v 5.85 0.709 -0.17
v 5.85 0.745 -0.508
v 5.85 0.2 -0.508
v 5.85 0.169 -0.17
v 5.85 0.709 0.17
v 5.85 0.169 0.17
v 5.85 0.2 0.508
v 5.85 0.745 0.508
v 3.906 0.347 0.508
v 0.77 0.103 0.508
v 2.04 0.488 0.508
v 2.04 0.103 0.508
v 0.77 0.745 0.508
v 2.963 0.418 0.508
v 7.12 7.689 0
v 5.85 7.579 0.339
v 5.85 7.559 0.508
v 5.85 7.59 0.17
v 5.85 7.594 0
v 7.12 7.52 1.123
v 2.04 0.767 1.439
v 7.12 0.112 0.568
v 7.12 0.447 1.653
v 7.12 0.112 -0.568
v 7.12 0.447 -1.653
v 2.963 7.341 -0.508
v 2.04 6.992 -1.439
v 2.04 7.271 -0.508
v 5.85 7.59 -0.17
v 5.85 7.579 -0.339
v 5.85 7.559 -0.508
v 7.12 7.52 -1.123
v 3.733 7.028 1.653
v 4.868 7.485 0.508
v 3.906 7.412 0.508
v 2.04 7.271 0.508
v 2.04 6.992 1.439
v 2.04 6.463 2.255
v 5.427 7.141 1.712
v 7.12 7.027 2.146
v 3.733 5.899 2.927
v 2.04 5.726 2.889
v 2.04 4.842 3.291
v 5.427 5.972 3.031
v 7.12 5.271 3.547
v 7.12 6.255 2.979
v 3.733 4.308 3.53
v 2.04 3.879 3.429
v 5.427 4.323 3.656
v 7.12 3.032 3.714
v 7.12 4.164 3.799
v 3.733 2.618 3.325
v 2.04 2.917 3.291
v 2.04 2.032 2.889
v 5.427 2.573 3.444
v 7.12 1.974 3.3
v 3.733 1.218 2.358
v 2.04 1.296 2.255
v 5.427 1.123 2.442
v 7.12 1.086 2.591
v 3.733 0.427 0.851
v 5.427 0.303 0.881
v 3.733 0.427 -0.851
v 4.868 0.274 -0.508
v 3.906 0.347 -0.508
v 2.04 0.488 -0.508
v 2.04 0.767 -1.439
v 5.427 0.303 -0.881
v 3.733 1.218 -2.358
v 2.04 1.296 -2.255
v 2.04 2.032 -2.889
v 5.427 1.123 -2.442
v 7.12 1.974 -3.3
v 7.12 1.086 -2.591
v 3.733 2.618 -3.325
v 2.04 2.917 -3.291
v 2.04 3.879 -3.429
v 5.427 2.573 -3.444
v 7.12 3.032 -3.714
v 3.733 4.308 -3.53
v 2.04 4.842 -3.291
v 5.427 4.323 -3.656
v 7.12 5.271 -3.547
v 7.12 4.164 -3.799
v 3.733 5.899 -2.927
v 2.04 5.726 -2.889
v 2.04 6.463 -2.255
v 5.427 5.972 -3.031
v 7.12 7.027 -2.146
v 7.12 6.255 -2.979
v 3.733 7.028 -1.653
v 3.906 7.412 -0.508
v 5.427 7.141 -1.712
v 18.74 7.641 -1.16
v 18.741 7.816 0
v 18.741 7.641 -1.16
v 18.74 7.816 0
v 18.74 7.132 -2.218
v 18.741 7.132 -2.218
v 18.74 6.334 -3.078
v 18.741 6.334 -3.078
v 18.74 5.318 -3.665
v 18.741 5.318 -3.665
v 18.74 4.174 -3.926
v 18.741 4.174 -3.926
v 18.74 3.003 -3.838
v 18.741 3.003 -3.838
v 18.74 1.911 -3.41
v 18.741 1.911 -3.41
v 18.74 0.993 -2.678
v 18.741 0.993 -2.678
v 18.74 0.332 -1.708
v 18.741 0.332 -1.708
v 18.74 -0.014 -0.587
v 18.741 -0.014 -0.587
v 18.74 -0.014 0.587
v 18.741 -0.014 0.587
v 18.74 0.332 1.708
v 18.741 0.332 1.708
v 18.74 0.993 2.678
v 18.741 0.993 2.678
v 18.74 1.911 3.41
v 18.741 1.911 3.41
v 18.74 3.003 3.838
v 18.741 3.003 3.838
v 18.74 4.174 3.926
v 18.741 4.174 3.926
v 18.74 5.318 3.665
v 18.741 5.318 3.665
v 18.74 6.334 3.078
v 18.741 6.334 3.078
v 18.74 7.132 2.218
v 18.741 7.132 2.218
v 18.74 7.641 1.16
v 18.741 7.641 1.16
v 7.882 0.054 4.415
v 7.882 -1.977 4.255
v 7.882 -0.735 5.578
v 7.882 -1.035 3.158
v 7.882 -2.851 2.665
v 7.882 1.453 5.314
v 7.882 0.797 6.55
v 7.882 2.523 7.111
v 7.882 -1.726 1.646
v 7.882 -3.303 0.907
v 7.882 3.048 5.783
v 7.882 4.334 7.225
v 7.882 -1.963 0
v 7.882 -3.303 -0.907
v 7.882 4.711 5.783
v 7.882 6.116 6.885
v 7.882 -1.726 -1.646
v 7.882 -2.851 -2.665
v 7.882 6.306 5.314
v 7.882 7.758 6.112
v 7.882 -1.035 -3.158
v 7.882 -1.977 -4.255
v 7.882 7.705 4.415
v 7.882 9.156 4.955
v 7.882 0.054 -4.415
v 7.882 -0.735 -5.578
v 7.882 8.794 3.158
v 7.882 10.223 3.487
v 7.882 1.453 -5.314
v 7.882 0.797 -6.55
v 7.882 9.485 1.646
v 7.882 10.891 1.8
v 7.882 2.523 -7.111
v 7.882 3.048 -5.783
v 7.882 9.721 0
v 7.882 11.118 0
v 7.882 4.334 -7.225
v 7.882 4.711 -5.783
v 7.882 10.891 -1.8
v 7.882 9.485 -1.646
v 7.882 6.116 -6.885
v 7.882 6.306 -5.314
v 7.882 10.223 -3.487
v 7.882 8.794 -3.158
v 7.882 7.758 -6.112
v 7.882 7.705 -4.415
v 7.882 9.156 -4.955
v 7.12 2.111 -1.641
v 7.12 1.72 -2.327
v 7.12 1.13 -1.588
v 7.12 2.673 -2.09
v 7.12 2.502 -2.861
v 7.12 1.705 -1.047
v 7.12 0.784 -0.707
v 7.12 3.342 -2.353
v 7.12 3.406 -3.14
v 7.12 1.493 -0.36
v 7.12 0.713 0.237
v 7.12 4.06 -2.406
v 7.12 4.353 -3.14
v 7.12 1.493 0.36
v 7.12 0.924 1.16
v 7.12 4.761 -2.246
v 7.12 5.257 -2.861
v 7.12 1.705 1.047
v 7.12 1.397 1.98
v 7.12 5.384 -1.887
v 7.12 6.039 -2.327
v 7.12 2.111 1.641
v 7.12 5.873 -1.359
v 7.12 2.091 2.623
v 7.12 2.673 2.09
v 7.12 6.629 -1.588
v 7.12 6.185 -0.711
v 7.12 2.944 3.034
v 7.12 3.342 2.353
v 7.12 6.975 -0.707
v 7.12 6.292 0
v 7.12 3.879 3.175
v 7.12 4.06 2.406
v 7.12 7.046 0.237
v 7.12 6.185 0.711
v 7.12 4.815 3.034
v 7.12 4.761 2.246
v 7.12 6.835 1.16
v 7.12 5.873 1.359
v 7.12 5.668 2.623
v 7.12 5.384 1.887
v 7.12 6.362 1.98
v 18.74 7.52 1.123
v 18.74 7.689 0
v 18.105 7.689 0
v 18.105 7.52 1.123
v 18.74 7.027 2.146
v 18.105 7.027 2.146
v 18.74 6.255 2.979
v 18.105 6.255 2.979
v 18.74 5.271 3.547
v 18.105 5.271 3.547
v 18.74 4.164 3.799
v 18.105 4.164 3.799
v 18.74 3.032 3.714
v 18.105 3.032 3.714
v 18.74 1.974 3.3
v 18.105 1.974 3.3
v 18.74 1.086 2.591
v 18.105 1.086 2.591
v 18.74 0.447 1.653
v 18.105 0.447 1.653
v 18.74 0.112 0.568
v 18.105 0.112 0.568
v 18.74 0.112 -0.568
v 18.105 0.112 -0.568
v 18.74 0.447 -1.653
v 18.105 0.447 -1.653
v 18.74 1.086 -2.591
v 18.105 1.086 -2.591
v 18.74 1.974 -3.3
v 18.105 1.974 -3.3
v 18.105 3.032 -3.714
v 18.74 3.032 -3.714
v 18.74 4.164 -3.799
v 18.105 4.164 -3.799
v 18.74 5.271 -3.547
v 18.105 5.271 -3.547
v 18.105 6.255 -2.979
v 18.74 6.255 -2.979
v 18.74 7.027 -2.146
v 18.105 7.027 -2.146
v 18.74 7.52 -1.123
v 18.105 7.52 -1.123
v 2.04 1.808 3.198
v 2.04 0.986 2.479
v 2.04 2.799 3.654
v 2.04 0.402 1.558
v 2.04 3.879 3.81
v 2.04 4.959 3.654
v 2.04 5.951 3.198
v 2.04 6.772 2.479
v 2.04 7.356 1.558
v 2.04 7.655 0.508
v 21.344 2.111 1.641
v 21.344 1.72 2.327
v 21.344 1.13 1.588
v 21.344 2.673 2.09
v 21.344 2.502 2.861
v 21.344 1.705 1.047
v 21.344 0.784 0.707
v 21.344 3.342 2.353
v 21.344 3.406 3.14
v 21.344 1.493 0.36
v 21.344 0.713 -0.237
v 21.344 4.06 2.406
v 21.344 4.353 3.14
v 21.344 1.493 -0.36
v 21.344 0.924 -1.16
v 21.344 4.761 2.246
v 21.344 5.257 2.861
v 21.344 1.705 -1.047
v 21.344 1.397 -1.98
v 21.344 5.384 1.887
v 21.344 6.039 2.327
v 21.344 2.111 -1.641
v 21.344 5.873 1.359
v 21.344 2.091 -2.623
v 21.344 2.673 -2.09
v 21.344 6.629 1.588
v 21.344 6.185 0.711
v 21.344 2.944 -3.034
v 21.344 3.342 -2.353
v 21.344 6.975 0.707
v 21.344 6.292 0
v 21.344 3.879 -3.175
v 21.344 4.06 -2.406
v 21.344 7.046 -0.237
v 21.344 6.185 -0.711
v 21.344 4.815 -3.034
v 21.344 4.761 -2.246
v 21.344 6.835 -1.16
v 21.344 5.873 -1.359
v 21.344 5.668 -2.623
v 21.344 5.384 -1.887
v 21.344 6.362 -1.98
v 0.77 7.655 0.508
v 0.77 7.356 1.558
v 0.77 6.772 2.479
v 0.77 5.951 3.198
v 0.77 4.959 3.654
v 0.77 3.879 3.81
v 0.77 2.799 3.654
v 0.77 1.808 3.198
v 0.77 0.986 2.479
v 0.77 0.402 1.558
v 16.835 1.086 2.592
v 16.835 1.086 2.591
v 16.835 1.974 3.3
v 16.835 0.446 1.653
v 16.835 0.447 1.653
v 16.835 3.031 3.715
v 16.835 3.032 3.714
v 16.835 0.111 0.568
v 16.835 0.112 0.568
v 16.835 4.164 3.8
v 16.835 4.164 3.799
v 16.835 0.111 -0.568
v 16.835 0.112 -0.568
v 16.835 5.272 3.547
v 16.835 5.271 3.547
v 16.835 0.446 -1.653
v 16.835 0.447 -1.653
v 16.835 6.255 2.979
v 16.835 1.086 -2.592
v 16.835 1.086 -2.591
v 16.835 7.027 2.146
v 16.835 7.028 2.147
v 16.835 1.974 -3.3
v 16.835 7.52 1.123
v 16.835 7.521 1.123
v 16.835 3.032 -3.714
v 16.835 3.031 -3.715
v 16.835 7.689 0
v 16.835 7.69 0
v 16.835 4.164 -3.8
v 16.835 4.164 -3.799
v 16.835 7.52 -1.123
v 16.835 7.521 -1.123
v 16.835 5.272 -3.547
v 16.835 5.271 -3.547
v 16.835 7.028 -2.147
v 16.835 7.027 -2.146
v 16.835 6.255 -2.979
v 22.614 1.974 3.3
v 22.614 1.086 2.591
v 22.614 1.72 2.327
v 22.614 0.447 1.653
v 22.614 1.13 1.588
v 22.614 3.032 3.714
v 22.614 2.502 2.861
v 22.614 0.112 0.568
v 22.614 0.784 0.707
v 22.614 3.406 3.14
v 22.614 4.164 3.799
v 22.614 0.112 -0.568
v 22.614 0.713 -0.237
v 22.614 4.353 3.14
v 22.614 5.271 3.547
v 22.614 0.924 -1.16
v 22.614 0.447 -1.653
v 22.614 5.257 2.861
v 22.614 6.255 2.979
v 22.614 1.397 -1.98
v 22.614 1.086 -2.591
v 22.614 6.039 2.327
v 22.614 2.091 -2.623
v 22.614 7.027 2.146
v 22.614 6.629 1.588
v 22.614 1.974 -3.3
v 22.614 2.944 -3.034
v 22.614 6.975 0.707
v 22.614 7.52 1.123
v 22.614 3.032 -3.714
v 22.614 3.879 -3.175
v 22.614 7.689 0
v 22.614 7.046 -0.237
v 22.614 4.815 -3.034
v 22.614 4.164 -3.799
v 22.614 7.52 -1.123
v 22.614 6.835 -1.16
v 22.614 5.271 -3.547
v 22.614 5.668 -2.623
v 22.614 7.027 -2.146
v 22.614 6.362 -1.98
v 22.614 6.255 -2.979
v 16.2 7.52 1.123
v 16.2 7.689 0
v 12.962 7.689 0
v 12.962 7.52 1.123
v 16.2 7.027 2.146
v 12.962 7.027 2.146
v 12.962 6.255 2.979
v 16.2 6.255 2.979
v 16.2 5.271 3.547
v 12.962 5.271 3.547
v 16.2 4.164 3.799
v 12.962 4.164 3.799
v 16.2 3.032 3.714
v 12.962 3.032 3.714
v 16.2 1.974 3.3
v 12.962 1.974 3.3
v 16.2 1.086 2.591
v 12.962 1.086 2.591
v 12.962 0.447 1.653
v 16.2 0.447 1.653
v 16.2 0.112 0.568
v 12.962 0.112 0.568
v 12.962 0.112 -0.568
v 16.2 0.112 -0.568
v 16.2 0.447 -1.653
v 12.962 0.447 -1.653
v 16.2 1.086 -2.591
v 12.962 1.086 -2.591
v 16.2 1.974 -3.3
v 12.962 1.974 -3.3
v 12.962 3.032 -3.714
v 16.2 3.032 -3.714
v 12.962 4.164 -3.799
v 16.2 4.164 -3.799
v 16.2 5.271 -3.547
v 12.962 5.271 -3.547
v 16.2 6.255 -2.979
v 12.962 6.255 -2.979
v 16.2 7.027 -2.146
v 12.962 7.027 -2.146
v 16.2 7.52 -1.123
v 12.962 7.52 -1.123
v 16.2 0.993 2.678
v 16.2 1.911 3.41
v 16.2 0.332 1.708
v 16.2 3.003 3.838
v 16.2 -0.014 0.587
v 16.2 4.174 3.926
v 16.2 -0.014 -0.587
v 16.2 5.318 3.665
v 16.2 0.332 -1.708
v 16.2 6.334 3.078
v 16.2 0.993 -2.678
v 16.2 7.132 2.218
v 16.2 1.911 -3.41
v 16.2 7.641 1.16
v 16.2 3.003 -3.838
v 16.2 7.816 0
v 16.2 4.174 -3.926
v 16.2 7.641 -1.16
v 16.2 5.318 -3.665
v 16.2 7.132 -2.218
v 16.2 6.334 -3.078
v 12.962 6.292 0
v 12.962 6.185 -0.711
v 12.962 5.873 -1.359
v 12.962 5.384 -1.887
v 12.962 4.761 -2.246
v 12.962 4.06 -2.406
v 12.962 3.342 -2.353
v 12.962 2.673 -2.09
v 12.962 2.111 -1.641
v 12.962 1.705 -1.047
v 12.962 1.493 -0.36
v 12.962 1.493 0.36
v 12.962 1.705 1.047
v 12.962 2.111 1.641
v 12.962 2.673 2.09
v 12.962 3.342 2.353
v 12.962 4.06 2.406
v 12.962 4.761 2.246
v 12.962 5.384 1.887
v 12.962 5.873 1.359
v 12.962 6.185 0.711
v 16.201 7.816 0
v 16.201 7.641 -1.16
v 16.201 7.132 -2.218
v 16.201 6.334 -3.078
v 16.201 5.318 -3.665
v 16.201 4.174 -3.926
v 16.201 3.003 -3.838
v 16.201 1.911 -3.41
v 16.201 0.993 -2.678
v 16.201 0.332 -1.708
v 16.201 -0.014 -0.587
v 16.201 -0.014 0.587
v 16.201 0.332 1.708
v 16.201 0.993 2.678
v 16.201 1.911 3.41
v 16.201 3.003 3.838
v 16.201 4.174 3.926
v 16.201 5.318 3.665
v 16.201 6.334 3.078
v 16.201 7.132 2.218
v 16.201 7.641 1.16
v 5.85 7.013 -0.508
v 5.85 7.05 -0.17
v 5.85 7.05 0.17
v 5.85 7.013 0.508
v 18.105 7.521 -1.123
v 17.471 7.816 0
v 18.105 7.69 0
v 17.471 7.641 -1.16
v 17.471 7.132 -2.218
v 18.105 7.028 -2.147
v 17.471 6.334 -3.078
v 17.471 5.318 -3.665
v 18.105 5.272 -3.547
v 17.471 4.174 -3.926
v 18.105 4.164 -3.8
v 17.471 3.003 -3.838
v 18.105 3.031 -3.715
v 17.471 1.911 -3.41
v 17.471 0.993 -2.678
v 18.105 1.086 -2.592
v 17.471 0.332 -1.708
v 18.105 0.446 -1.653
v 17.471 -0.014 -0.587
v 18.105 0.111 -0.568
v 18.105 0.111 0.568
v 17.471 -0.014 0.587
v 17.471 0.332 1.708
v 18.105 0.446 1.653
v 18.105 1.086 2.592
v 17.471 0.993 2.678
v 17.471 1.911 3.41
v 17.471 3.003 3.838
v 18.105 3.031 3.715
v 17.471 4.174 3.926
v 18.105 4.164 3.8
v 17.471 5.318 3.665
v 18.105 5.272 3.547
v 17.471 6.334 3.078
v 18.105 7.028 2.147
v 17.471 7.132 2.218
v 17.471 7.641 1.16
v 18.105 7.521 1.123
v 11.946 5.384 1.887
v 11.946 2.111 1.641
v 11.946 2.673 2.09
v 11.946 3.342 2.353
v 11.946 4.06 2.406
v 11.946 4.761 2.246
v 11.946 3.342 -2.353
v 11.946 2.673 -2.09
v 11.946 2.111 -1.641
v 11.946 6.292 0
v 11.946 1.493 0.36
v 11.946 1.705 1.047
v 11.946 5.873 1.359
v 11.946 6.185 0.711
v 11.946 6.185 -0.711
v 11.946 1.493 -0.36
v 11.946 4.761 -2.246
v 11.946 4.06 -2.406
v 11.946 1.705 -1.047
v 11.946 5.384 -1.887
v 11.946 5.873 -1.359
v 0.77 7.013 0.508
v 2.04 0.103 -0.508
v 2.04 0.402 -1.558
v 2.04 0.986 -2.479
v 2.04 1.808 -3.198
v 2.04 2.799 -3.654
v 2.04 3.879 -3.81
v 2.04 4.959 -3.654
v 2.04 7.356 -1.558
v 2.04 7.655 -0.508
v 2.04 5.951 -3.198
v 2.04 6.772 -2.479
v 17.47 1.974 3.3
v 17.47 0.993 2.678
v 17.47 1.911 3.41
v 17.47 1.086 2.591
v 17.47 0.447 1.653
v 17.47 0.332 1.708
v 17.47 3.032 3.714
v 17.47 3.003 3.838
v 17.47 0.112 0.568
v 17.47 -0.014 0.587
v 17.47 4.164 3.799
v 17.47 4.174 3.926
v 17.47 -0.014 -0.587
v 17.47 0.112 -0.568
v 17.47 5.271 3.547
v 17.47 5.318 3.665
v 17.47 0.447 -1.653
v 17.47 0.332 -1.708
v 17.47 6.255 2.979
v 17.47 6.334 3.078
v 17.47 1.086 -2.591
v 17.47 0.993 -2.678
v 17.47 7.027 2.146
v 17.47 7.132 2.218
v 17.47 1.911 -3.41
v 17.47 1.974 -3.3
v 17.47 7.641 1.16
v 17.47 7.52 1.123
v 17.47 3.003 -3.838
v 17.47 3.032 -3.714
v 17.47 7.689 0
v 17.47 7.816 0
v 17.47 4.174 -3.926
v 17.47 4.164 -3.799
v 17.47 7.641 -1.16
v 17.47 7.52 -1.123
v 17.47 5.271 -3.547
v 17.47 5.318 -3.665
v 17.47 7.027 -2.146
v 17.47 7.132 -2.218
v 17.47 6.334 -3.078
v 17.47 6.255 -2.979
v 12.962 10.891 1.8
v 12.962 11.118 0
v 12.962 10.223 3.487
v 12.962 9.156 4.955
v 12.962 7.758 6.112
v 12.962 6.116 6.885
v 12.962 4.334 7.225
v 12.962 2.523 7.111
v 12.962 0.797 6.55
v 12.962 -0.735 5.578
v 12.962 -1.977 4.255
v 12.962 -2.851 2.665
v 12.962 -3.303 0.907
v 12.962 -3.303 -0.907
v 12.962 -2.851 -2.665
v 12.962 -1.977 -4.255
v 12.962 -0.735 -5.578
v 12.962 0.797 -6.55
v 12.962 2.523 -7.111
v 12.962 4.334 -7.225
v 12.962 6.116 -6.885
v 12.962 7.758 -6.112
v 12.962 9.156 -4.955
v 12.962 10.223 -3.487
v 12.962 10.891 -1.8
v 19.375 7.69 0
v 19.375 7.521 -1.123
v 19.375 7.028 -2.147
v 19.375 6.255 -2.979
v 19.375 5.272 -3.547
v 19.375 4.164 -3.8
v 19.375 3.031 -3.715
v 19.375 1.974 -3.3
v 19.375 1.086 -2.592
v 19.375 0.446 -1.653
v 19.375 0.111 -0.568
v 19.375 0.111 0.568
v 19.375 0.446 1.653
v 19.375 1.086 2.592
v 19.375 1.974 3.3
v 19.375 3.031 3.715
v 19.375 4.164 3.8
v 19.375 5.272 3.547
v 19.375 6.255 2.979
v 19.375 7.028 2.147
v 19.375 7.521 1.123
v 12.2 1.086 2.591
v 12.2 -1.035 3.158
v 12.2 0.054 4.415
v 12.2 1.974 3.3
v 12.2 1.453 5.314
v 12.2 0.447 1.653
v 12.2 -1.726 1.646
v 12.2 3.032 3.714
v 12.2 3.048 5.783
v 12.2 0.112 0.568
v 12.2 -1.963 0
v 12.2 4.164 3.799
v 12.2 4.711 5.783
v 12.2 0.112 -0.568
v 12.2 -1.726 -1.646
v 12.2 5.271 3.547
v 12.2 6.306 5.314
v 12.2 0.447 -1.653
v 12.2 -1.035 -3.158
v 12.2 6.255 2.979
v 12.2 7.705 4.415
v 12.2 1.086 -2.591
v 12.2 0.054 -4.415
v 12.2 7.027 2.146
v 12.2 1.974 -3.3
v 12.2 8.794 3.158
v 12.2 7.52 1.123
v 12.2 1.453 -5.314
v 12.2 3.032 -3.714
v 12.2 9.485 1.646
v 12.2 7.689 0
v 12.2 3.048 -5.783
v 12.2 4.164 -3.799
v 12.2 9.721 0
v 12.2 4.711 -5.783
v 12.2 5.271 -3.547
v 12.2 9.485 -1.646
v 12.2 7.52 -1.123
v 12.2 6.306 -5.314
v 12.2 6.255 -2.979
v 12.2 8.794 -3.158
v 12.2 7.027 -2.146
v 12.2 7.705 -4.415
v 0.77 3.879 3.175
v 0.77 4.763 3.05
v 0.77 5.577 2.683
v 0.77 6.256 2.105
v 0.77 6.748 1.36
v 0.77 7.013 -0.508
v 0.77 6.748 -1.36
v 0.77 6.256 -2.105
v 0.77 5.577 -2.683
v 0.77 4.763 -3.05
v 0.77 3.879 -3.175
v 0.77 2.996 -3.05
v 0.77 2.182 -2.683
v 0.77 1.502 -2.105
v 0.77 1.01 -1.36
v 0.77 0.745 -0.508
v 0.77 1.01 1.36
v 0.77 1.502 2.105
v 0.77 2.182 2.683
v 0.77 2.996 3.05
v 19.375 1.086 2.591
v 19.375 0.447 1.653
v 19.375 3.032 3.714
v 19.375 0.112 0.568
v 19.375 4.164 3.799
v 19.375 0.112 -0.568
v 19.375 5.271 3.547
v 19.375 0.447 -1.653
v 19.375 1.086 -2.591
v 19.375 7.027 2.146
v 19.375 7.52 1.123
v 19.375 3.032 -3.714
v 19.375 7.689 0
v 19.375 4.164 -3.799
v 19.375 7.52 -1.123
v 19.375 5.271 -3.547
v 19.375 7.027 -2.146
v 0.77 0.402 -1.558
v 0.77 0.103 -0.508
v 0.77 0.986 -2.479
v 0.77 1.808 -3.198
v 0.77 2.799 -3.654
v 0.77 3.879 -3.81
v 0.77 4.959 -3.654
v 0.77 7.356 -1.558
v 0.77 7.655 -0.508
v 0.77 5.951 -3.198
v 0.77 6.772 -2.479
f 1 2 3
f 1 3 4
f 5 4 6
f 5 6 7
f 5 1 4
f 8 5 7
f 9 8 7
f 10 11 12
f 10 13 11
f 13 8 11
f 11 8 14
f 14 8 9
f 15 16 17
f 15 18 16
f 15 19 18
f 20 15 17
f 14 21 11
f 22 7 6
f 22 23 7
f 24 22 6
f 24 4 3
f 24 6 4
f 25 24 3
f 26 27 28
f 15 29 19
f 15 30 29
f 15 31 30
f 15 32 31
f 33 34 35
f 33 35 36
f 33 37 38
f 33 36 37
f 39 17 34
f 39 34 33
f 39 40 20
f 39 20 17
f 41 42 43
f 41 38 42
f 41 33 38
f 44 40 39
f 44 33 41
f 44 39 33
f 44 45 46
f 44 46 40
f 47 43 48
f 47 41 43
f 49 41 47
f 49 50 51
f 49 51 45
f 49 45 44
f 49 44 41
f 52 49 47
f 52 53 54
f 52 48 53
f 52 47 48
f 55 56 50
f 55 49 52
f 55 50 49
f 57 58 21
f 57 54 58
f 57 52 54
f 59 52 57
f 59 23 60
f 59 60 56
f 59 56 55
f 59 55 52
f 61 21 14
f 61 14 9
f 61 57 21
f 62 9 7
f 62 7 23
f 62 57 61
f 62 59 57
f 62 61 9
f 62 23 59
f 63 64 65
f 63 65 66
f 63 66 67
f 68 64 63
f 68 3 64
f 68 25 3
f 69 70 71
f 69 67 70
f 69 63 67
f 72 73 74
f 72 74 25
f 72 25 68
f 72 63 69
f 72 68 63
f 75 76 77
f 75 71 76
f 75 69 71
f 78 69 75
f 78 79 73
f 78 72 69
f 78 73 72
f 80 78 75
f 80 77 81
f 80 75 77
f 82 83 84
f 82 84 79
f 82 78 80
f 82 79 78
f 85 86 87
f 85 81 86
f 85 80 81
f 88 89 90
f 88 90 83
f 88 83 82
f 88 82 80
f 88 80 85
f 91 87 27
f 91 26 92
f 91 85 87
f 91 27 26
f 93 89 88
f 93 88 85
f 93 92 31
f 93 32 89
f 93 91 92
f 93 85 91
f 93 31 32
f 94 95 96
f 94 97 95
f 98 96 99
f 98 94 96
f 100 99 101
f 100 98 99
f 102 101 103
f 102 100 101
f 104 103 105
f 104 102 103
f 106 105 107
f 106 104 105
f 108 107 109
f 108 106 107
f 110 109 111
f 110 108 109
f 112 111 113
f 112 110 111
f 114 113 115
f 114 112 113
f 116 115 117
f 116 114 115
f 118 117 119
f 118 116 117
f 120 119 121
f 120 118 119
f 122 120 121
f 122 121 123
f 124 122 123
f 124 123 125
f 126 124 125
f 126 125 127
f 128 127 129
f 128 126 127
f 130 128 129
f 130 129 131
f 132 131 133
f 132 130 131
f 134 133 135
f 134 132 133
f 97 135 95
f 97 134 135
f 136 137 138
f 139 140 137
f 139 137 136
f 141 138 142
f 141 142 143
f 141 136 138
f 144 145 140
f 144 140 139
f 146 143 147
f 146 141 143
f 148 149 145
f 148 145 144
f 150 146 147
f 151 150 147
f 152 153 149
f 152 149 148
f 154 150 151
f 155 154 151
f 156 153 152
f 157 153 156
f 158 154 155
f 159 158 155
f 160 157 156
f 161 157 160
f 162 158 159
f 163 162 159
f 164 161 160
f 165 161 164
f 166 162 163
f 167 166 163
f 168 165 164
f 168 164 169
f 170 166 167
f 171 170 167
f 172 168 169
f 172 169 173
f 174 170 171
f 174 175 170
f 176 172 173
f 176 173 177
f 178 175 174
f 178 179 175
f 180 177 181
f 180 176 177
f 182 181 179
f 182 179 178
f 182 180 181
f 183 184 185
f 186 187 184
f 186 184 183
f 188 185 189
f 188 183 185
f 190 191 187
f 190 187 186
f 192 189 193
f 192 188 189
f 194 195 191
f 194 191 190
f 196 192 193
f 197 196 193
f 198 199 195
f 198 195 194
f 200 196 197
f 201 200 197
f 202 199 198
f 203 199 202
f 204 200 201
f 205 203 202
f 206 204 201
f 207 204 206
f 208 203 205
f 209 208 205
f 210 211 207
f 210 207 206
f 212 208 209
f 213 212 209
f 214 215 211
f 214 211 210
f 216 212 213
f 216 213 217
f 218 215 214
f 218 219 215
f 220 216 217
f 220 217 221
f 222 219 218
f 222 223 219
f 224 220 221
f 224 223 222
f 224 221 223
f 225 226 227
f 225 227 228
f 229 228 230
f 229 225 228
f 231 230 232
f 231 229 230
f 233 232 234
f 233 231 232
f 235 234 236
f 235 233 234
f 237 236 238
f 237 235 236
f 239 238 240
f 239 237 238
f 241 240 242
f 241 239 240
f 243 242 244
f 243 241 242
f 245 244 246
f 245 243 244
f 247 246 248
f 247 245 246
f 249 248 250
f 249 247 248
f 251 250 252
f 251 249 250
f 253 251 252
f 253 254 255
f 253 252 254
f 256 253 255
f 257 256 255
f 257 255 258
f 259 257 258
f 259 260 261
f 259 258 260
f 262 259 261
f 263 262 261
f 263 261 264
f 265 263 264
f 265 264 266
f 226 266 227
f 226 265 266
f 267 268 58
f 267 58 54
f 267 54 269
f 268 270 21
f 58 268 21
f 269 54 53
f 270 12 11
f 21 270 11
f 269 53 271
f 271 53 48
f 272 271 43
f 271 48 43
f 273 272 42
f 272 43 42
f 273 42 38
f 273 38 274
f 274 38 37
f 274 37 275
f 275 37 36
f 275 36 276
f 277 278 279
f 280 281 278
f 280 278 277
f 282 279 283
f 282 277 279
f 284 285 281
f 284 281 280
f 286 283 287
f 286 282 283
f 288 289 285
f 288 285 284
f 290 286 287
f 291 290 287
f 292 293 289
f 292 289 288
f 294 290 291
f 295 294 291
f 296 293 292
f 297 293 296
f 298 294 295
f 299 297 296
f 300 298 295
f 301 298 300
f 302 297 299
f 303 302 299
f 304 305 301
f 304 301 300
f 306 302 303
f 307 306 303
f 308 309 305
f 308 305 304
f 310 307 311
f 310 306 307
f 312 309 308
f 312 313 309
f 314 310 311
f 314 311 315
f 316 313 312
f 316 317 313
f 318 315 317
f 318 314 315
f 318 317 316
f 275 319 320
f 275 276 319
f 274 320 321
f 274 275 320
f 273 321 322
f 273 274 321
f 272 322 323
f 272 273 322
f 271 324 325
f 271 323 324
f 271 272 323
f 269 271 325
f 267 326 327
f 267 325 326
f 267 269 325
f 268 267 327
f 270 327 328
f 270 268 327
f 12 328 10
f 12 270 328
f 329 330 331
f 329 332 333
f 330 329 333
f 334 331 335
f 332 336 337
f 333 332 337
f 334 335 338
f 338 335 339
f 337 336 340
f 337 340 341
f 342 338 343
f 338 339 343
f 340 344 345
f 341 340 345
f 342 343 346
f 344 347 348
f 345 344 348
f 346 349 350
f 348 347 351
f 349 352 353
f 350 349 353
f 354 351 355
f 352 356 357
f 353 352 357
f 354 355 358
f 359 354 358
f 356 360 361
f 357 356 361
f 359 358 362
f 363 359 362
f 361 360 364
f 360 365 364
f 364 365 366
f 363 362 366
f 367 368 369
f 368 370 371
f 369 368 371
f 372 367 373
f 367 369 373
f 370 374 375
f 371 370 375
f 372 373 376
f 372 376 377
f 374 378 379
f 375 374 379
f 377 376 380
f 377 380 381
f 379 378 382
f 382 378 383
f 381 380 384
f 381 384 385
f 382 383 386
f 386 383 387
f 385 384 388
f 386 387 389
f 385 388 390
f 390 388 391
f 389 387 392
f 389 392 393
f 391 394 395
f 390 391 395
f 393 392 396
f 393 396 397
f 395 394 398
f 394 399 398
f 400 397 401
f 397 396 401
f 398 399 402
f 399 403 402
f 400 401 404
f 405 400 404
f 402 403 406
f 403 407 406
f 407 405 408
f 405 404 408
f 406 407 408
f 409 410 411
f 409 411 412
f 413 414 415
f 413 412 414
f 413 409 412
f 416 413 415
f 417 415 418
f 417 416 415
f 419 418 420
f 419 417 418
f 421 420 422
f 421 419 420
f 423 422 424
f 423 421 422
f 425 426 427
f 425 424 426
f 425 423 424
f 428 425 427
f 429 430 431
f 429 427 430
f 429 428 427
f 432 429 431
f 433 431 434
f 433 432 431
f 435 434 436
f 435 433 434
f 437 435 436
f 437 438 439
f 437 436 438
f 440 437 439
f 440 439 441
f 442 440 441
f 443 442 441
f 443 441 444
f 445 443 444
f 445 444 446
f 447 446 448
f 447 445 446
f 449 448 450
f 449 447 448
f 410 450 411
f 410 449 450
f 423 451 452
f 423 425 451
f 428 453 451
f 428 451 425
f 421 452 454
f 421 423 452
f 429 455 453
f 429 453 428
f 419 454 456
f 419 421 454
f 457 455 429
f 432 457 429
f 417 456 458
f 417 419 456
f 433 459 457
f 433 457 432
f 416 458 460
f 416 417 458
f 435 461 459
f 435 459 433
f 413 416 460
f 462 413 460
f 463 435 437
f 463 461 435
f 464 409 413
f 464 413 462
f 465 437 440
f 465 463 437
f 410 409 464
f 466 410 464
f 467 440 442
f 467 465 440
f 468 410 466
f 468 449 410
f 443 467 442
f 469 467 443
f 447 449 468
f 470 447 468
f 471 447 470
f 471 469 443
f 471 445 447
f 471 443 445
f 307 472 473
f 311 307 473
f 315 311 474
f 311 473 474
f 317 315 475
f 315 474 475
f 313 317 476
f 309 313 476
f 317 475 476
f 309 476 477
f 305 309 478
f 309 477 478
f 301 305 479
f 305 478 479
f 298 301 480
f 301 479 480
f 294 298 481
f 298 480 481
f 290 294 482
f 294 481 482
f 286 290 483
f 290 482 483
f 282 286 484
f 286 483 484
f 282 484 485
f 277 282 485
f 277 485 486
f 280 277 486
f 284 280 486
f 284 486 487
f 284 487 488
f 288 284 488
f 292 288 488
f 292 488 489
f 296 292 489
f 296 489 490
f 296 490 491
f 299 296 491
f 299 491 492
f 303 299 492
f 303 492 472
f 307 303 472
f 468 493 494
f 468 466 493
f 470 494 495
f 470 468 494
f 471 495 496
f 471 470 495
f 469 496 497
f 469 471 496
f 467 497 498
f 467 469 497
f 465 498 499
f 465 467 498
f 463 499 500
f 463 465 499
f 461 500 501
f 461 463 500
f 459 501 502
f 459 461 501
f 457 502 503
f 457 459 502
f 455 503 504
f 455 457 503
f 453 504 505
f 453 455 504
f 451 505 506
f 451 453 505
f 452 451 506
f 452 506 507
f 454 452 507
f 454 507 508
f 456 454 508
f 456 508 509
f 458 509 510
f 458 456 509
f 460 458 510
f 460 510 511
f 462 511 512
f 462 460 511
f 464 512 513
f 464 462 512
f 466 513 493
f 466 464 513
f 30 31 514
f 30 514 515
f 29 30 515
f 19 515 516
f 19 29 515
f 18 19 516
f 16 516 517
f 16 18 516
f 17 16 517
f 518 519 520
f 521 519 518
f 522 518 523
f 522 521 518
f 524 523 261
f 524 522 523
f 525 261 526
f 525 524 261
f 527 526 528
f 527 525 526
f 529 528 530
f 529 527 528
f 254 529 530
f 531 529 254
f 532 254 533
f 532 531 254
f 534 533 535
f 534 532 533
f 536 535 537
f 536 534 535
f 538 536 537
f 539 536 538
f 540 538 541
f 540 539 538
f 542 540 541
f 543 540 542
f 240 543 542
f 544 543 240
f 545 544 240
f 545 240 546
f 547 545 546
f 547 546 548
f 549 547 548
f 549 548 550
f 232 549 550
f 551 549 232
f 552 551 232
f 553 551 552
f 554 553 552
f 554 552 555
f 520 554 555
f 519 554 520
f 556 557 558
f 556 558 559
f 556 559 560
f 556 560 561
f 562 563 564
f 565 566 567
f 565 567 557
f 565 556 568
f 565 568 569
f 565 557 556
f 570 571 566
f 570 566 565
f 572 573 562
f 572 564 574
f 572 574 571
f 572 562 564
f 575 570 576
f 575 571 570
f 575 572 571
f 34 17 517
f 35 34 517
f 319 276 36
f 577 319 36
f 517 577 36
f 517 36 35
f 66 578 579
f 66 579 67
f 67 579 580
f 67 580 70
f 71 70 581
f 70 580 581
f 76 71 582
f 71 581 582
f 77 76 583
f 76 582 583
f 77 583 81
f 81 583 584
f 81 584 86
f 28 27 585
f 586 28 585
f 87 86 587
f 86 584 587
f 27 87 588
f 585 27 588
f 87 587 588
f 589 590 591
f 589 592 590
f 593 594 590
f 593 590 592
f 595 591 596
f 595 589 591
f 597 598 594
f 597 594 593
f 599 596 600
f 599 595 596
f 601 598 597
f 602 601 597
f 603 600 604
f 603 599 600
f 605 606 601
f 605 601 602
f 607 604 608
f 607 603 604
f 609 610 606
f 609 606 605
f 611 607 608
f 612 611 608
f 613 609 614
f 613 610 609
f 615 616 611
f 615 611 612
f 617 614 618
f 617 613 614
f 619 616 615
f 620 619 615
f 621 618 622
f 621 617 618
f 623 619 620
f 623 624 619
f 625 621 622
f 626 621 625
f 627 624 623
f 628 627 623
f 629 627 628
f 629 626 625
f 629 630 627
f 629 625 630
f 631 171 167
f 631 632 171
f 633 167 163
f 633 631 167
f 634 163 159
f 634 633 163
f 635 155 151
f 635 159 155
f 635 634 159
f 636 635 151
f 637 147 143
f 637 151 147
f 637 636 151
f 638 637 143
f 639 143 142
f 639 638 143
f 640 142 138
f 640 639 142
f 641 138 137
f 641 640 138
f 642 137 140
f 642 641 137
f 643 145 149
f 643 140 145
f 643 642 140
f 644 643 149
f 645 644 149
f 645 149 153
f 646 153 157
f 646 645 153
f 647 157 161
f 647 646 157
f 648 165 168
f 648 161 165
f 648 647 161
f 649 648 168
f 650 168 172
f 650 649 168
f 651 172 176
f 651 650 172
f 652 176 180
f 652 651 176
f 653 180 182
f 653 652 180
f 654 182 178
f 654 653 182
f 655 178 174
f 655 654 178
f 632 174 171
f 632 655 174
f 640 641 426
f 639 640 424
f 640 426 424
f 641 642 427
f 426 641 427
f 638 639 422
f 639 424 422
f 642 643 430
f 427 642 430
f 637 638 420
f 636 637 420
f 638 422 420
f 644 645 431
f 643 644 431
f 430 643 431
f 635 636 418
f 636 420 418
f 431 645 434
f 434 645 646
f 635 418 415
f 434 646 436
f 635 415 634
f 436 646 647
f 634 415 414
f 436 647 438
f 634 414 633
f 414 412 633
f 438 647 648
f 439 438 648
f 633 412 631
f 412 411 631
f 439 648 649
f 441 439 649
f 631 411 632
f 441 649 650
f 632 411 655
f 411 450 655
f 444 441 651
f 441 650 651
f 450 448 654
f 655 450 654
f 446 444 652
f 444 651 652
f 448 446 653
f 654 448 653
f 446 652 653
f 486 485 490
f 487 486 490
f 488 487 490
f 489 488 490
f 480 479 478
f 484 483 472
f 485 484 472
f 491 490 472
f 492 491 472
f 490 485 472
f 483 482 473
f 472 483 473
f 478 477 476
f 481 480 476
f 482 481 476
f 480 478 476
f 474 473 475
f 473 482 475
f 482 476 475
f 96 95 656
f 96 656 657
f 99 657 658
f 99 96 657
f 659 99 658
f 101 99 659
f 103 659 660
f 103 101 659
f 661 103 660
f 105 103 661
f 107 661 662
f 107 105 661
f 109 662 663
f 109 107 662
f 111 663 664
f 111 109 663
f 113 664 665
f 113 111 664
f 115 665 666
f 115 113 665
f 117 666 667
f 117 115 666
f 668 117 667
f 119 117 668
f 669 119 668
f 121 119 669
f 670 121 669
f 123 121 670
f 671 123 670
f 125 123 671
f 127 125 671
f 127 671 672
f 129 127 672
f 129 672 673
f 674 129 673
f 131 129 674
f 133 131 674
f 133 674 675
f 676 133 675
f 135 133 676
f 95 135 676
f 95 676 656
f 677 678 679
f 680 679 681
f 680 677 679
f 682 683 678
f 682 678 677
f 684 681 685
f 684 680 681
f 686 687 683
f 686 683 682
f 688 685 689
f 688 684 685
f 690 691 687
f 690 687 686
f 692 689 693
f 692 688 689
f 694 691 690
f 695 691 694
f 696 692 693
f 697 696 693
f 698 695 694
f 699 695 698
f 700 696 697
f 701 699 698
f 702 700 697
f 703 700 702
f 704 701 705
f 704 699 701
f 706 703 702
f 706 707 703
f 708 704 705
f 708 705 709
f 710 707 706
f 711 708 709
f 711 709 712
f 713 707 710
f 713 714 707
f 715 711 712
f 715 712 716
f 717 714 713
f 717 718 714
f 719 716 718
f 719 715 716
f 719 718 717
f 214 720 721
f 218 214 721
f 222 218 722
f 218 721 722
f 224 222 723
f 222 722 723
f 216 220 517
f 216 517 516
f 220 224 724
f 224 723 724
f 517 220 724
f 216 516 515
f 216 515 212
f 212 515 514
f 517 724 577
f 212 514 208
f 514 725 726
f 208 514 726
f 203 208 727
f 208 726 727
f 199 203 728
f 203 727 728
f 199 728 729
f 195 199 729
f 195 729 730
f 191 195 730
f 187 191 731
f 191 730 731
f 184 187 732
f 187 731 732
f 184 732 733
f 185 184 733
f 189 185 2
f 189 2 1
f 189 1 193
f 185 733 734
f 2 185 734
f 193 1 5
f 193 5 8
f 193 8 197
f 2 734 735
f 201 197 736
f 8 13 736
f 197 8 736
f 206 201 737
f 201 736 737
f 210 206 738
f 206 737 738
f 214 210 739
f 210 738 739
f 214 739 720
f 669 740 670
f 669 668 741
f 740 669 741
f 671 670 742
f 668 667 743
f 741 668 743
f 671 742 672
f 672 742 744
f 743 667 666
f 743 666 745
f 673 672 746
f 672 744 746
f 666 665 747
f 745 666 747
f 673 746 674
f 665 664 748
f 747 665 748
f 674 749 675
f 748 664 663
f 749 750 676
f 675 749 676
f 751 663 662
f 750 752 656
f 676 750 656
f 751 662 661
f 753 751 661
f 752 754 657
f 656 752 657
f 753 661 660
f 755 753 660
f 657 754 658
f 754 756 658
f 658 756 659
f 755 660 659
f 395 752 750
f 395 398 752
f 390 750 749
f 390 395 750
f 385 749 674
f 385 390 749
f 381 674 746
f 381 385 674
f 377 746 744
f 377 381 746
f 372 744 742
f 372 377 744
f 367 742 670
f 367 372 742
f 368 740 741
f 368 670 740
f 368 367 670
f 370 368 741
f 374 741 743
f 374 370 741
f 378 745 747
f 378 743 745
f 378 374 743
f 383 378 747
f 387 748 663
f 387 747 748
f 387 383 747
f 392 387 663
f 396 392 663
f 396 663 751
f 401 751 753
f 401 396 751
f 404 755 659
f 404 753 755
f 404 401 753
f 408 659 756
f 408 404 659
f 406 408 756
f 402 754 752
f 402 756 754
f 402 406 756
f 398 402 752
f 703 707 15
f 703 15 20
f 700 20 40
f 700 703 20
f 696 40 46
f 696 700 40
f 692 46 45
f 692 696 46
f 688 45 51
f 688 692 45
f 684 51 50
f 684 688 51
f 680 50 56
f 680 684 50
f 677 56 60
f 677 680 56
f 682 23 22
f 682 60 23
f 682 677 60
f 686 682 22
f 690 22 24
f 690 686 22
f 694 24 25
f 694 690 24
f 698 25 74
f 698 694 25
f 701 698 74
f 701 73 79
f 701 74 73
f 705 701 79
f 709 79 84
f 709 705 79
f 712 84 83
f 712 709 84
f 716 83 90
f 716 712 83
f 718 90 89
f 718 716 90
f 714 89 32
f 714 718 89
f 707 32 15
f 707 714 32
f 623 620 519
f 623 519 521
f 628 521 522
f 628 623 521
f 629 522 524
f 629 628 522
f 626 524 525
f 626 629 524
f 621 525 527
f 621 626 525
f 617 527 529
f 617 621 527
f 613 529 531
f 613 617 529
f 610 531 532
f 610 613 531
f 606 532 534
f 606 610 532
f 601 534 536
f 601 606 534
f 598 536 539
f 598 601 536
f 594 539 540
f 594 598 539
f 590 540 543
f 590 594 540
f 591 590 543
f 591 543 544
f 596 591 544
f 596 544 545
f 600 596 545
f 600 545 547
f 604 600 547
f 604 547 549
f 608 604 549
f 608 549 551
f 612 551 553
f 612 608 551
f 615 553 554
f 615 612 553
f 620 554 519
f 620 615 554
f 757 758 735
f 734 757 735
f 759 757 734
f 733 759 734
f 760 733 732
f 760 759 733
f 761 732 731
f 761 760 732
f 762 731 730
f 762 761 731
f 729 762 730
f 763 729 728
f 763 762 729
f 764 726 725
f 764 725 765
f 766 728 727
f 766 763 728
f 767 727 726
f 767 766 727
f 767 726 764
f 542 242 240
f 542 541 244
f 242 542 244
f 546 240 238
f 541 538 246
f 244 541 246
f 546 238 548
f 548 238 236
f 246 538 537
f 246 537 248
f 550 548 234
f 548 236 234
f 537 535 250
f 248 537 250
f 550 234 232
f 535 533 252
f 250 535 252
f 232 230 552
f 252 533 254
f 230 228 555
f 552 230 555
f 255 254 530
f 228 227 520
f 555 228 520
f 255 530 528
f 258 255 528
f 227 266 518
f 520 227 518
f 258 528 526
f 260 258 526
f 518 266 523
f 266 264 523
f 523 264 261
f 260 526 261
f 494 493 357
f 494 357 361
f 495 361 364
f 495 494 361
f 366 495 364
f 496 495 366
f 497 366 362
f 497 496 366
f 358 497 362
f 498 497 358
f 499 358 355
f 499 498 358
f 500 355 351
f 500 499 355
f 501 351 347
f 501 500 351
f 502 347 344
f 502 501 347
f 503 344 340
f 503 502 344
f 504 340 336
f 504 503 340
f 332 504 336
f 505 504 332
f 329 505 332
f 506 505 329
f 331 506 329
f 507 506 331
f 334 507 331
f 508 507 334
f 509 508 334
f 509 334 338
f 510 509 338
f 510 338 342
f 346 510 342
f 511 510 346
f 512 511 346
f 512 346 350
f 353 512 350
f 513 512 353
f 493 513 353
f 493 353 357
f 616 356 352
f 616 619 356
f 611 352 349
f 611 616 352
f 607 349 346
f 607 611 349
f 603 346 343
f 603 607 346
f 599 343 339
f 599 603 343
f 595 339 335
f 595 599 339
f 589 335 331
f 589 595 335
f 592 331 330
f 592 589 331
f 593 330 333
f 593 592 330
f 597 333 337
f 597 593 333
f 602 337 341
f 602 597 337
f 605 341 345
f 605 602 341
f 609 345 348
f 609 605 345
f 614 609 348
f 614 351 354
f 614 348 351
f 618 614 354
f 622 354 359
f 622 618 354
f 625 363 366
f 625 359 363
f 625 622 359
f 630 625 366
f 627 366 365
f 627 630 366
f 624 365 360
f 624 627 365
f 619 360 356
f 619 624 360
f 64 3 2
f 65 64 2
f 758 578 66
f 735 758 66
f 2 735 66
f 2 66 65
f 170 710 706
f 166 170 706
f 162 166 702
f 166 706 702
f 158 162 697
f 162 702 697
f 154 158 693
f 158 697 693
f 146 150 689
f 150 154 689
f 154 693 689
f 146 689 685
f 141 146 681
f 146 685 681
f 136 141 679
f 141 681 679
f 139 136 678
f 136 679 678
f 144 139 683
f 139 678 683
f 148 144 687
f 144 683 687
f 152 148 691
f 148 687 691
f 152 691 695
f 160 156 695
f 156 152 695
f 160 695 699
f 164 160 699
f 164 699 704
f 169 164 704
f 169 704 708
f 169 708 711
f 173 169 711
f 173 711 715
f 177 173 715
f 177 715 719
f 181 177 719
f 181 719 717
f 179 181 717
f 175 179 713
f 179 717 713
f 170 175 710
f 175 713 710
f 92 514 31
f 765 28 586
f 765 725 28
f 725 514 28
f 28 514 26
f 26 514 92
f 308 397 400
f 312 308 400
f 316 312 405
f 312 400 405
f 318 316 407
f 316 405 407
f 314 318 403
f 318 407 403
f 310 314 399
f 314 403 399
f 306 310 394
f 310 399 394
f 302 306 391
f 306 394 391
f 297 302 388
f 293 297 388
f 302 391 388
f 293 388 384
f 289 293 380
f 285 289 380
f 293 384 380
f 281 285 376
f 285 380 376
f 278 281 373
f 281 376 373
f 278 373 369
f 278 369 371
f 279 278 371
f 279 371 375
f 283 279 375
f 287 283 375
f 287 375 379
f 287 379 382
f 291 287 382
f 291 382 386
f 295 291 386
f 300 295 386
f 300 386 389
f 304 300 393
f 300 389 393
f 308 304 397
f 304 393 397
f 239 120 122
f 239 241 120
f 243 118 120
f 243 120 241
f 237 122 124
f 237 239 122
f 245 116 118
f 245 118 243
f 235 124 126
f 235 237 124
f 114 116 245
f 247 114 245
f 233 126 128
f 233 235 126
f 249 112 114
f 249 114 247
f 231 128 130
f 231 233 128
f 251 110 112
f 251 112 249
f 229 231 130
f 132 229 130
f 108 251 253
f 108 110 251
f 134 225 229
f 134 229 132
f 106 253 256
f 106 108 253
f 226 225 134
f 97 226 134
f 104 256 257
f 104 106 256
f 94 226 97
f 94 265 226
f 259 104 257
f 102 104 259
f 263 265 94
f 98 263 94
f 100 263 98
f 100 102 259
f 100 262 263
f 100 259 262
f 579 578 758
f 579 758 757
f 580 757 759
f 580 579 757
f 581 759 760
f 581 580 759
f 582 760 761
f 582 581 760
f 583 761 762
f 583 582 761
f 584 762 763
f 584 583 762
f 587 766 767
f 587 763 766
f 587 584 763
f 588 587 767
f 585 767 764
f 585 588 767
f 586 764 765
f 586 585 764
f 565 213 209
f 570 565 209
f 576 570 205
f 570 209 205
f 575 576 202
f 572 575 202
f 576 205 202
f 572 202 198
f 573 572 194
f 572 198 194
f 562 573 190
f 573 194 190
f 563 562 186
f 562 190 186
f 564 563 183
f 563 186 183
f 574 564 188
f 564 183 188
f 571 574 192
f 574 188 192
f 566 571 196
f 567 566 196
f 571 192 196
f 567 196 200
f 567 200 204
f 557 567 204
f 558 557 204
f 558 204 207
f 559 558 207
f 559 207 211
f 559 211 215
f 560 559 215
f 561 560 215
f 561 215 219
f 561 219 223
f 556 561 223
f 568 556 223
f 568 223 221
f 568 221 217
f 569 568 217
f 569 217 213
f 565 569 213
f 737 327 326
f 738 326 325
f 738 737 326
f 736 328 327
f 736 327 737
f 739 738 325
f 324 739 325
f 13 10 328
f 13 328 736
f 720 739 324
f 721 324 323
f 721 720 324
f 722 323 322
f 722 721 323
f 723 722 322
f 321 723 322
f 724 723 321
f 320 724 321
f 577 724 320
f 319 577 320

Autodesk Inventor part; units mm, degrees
ref_plane "YZ Plane" through (0, 0, 0) normal (1, 0, 0) x (0, 1, 0)
ref_plane "XZ Plane" through (0, 0, 0) normal (0, 1, 0) x (-1, 0, 0)
ref_plane "XY Plane" through (0, 0, 0) normal (0, 0, 1) x (1, 0, 0)
sketch "Sketch1" plane through (0, 0, 0) normal (0, 0, 1) x (1, 0, 0)
  line L0 (22.6139, 7.6894) -> (22.6139, 6.2924)
  line L1 (0.7699, 6.2924) -> (0.7699, 7.6894)
  line L2 (11.9459, 3.8794) -> (12.9619, 3.8794)
  line L3 (12.9619, 3.8794) -> (12.9619, 6.2924)
  line L4 (11.9459, 6.2924) -> (11.9459, 3.8794)
  line L5 (11.9459, 6.2924) -> (0.7699, 6.2924)
  line L6 (12.1999, 7.6894) -> (12.1999, 9.7214)
  line L7 (12.1999, 11.1184) -> (12.9619, 11.1184)
  line L8 (12.9619, 11.1184) -> (12.9619, 7.6894)
  line L9 (12.9619, 11.1184) -> (7.8819, 11.1184)
  line L10 (7.8819, 11.1184) -> (7.8819, 9.7214)
  line L11 (7.8819, 9.7214) -> (12.1999, 9.7214)
  line L12 (12.9619, 9.7214) -> (12.9619, 11.1184)
  line L13 (11.9459, 3.8794) -> (0.9057, 3.8794)
  line L14 (0.7699, 7.6894) -> (2.0399, 7.6894)
  line L15 (2.0399, 7.6894) -> (2.0399, 7.3084)
  line L16 (0.7699, 7.6894) -> (2.0399, 7.6894)
  line L17 (7.1199, 7.6894) -> (2.0399, 7.3084)
  line L18 (0.7699, 7.6894) -> (2.0399, 7.6894)
  line L19 (7.1199, 7.6894) -> (12.1999, 7.6894)
  line L20 (18.1054, 7.8164) -> (17.4704, 7.8164)
  line L21 (17.4704, 6.1654) -> (18.1054, 7.8164) construction
  line L22 (18.1054, 6.1654) -> (17.4704, 7.8164) construction
  line L23 (16.8354, 7.8164) -> (16.2004, 7.8164)
  line L24 (16.2004, 6.1654) -> (16.8354, 7.8164) construction
  line L25 (16.8354, 6.1654) -> (16.2004, 7.8164) construction
  line L26 (19.3754, 7.8164) -> (18.7404, 7.8164)
  line L27 (18.7404, 6.1654) -> (19.3754, 7.8164) construction
  line L28 (19.3754, 6.1654) -> (18.7404, 7.8164) construction
  line L29 (16.2004, 7.8164) -> (16.2004, 7.6894)
  line L30 (16.8354, 7.6894) -> (16.8354, 7.8164)
  line L31 (17.4704, 7.8164) -> (17.4704, 7.6894)
  line L32 (18.1054, 7.6894) -> (18.1054, 7.8164)
  line L33 (18.7404, 7.8164) -> (18.7404, 7.6894)
  line L34 (19.3754, 7.6894) -> (19.3754, 7.8164)
  line L35 (19.3265, 7.6894) -> (22.6139, 7.6894)
  line L36 (22.6139, 6.2924) -> (19.3265, 6.2924)
  line L37 (18.0565, 7.6894) -> (18.7892, 7.6894)
  line L38 (12.9619, 7.6894) -> (16.2492, 7.6894)
  line L39 (16.7865, 7.6894) -> (17.5192, 7.6894)
  line L40 (19.3265, 6.2924) -> (16.2492, 6.2924)
  line L41 (16.7865, 6.2924) -> (12.9619, 6.2924)
  point P0 (16.2004, 6.2924)
  point P1 (16.8354, 6.2924)
  point P2 (17.4704, 6.2924)
  point P3 (19.3754, 6.2924)
  dimension "d8" = 21.844
  dimension "d9" = 1.397
  dimension "d10" = 11.176
  dimension "d12" = 11.43
  dimension "d13" = 12.192
  dimension "d15" = 12.192
  dimension "d16" = 7.239
  dimension "d17" = 1.397
  dimension "d18" = 7.112
  dimension "d34" = 1.27
  dimension "d35" = 0.381
  dimension "d36" = 6.35
  dimension "d38" = 0.635
  dimension "d39" = 1.651
  dimension "d41" = 0.635
  dimension "d42" = 1.651
  dimension "d44" = 0.635
  dimension "d45" = 1.651
revolve "Revolution1" add sketch "Sketch1" angle 360 about axis through (11.9459, 3.8794, 0) along (-1, 0, 0)
sketch "Sketch2" plane through (22.6139, 3.8794, 0) normal (1, 0, 0) x (0, 0, -1)
  circle A0 centre (0, 0) radius 3.175
  point P0 (0, -3.8794)
  dimension "d20" = 6.35
extrude "Extrusion1" cut sketch "Sketch2" against normal blind 1.27
sketch "Sketch3" plane through (0.7699, 3.8794, 0) normal (-1, 0, 0) x (0, 0, 1)
  circle A0 centre (0, 0) radius 3.175
  point P0 (0, -3.8794)
  dimension "d26" = 6.35
extrude "Extrusion2" cut sketch "Sketch3" against normal blind 6.35
sketch "Sketch4" plane through (0.7699, 3.8794, 0) normal (-1, 0, 0) x (0, 0, 1)
  line L0 (0.508, -9.525) -> (-0.508, -9.525)
  line L1 (-0.508, -9.525) -> (-0.508, 9.525)
  line L2 (-0.508, 9.525) -> (0.508, 9.525)
  line L3 (0.508, 9.525) -> (0.508, -9.525)
  line L4 (0.508, -9.525) -> (-0.508, 9.525) construction
  line L5 (-0.508, -9.525) -> (0.508, 9.525) construction
  point P0 (0, -3.8794)
  point P1 (0, 0)
  dimension "d30" = 1.016
  dimension "d31" = 19.05
extrude "Extrusion3" cut sketch "Sketch4" against normal blind 5.08
chamfer "Chamfer1" distance 0.127 distance2 0.635 1 edges at (19.3754, -0.0576, 0) measured on face at (19.3754, 7.736, 0.3141)
chamfer "Chamfer2" distance 0.127 distance2 0.635 1 edges at (18.1054, -0.0576, 0) measured on face at (18.1054, 7.736, 0.3141)
chamfer "Chamfer3" distance 0.127 distance2 0.635 1 edges at (16.8354, -0.0576, 0) measured on face at (16.8354, 7.736, 0.3141)
properties part number "Axle"
